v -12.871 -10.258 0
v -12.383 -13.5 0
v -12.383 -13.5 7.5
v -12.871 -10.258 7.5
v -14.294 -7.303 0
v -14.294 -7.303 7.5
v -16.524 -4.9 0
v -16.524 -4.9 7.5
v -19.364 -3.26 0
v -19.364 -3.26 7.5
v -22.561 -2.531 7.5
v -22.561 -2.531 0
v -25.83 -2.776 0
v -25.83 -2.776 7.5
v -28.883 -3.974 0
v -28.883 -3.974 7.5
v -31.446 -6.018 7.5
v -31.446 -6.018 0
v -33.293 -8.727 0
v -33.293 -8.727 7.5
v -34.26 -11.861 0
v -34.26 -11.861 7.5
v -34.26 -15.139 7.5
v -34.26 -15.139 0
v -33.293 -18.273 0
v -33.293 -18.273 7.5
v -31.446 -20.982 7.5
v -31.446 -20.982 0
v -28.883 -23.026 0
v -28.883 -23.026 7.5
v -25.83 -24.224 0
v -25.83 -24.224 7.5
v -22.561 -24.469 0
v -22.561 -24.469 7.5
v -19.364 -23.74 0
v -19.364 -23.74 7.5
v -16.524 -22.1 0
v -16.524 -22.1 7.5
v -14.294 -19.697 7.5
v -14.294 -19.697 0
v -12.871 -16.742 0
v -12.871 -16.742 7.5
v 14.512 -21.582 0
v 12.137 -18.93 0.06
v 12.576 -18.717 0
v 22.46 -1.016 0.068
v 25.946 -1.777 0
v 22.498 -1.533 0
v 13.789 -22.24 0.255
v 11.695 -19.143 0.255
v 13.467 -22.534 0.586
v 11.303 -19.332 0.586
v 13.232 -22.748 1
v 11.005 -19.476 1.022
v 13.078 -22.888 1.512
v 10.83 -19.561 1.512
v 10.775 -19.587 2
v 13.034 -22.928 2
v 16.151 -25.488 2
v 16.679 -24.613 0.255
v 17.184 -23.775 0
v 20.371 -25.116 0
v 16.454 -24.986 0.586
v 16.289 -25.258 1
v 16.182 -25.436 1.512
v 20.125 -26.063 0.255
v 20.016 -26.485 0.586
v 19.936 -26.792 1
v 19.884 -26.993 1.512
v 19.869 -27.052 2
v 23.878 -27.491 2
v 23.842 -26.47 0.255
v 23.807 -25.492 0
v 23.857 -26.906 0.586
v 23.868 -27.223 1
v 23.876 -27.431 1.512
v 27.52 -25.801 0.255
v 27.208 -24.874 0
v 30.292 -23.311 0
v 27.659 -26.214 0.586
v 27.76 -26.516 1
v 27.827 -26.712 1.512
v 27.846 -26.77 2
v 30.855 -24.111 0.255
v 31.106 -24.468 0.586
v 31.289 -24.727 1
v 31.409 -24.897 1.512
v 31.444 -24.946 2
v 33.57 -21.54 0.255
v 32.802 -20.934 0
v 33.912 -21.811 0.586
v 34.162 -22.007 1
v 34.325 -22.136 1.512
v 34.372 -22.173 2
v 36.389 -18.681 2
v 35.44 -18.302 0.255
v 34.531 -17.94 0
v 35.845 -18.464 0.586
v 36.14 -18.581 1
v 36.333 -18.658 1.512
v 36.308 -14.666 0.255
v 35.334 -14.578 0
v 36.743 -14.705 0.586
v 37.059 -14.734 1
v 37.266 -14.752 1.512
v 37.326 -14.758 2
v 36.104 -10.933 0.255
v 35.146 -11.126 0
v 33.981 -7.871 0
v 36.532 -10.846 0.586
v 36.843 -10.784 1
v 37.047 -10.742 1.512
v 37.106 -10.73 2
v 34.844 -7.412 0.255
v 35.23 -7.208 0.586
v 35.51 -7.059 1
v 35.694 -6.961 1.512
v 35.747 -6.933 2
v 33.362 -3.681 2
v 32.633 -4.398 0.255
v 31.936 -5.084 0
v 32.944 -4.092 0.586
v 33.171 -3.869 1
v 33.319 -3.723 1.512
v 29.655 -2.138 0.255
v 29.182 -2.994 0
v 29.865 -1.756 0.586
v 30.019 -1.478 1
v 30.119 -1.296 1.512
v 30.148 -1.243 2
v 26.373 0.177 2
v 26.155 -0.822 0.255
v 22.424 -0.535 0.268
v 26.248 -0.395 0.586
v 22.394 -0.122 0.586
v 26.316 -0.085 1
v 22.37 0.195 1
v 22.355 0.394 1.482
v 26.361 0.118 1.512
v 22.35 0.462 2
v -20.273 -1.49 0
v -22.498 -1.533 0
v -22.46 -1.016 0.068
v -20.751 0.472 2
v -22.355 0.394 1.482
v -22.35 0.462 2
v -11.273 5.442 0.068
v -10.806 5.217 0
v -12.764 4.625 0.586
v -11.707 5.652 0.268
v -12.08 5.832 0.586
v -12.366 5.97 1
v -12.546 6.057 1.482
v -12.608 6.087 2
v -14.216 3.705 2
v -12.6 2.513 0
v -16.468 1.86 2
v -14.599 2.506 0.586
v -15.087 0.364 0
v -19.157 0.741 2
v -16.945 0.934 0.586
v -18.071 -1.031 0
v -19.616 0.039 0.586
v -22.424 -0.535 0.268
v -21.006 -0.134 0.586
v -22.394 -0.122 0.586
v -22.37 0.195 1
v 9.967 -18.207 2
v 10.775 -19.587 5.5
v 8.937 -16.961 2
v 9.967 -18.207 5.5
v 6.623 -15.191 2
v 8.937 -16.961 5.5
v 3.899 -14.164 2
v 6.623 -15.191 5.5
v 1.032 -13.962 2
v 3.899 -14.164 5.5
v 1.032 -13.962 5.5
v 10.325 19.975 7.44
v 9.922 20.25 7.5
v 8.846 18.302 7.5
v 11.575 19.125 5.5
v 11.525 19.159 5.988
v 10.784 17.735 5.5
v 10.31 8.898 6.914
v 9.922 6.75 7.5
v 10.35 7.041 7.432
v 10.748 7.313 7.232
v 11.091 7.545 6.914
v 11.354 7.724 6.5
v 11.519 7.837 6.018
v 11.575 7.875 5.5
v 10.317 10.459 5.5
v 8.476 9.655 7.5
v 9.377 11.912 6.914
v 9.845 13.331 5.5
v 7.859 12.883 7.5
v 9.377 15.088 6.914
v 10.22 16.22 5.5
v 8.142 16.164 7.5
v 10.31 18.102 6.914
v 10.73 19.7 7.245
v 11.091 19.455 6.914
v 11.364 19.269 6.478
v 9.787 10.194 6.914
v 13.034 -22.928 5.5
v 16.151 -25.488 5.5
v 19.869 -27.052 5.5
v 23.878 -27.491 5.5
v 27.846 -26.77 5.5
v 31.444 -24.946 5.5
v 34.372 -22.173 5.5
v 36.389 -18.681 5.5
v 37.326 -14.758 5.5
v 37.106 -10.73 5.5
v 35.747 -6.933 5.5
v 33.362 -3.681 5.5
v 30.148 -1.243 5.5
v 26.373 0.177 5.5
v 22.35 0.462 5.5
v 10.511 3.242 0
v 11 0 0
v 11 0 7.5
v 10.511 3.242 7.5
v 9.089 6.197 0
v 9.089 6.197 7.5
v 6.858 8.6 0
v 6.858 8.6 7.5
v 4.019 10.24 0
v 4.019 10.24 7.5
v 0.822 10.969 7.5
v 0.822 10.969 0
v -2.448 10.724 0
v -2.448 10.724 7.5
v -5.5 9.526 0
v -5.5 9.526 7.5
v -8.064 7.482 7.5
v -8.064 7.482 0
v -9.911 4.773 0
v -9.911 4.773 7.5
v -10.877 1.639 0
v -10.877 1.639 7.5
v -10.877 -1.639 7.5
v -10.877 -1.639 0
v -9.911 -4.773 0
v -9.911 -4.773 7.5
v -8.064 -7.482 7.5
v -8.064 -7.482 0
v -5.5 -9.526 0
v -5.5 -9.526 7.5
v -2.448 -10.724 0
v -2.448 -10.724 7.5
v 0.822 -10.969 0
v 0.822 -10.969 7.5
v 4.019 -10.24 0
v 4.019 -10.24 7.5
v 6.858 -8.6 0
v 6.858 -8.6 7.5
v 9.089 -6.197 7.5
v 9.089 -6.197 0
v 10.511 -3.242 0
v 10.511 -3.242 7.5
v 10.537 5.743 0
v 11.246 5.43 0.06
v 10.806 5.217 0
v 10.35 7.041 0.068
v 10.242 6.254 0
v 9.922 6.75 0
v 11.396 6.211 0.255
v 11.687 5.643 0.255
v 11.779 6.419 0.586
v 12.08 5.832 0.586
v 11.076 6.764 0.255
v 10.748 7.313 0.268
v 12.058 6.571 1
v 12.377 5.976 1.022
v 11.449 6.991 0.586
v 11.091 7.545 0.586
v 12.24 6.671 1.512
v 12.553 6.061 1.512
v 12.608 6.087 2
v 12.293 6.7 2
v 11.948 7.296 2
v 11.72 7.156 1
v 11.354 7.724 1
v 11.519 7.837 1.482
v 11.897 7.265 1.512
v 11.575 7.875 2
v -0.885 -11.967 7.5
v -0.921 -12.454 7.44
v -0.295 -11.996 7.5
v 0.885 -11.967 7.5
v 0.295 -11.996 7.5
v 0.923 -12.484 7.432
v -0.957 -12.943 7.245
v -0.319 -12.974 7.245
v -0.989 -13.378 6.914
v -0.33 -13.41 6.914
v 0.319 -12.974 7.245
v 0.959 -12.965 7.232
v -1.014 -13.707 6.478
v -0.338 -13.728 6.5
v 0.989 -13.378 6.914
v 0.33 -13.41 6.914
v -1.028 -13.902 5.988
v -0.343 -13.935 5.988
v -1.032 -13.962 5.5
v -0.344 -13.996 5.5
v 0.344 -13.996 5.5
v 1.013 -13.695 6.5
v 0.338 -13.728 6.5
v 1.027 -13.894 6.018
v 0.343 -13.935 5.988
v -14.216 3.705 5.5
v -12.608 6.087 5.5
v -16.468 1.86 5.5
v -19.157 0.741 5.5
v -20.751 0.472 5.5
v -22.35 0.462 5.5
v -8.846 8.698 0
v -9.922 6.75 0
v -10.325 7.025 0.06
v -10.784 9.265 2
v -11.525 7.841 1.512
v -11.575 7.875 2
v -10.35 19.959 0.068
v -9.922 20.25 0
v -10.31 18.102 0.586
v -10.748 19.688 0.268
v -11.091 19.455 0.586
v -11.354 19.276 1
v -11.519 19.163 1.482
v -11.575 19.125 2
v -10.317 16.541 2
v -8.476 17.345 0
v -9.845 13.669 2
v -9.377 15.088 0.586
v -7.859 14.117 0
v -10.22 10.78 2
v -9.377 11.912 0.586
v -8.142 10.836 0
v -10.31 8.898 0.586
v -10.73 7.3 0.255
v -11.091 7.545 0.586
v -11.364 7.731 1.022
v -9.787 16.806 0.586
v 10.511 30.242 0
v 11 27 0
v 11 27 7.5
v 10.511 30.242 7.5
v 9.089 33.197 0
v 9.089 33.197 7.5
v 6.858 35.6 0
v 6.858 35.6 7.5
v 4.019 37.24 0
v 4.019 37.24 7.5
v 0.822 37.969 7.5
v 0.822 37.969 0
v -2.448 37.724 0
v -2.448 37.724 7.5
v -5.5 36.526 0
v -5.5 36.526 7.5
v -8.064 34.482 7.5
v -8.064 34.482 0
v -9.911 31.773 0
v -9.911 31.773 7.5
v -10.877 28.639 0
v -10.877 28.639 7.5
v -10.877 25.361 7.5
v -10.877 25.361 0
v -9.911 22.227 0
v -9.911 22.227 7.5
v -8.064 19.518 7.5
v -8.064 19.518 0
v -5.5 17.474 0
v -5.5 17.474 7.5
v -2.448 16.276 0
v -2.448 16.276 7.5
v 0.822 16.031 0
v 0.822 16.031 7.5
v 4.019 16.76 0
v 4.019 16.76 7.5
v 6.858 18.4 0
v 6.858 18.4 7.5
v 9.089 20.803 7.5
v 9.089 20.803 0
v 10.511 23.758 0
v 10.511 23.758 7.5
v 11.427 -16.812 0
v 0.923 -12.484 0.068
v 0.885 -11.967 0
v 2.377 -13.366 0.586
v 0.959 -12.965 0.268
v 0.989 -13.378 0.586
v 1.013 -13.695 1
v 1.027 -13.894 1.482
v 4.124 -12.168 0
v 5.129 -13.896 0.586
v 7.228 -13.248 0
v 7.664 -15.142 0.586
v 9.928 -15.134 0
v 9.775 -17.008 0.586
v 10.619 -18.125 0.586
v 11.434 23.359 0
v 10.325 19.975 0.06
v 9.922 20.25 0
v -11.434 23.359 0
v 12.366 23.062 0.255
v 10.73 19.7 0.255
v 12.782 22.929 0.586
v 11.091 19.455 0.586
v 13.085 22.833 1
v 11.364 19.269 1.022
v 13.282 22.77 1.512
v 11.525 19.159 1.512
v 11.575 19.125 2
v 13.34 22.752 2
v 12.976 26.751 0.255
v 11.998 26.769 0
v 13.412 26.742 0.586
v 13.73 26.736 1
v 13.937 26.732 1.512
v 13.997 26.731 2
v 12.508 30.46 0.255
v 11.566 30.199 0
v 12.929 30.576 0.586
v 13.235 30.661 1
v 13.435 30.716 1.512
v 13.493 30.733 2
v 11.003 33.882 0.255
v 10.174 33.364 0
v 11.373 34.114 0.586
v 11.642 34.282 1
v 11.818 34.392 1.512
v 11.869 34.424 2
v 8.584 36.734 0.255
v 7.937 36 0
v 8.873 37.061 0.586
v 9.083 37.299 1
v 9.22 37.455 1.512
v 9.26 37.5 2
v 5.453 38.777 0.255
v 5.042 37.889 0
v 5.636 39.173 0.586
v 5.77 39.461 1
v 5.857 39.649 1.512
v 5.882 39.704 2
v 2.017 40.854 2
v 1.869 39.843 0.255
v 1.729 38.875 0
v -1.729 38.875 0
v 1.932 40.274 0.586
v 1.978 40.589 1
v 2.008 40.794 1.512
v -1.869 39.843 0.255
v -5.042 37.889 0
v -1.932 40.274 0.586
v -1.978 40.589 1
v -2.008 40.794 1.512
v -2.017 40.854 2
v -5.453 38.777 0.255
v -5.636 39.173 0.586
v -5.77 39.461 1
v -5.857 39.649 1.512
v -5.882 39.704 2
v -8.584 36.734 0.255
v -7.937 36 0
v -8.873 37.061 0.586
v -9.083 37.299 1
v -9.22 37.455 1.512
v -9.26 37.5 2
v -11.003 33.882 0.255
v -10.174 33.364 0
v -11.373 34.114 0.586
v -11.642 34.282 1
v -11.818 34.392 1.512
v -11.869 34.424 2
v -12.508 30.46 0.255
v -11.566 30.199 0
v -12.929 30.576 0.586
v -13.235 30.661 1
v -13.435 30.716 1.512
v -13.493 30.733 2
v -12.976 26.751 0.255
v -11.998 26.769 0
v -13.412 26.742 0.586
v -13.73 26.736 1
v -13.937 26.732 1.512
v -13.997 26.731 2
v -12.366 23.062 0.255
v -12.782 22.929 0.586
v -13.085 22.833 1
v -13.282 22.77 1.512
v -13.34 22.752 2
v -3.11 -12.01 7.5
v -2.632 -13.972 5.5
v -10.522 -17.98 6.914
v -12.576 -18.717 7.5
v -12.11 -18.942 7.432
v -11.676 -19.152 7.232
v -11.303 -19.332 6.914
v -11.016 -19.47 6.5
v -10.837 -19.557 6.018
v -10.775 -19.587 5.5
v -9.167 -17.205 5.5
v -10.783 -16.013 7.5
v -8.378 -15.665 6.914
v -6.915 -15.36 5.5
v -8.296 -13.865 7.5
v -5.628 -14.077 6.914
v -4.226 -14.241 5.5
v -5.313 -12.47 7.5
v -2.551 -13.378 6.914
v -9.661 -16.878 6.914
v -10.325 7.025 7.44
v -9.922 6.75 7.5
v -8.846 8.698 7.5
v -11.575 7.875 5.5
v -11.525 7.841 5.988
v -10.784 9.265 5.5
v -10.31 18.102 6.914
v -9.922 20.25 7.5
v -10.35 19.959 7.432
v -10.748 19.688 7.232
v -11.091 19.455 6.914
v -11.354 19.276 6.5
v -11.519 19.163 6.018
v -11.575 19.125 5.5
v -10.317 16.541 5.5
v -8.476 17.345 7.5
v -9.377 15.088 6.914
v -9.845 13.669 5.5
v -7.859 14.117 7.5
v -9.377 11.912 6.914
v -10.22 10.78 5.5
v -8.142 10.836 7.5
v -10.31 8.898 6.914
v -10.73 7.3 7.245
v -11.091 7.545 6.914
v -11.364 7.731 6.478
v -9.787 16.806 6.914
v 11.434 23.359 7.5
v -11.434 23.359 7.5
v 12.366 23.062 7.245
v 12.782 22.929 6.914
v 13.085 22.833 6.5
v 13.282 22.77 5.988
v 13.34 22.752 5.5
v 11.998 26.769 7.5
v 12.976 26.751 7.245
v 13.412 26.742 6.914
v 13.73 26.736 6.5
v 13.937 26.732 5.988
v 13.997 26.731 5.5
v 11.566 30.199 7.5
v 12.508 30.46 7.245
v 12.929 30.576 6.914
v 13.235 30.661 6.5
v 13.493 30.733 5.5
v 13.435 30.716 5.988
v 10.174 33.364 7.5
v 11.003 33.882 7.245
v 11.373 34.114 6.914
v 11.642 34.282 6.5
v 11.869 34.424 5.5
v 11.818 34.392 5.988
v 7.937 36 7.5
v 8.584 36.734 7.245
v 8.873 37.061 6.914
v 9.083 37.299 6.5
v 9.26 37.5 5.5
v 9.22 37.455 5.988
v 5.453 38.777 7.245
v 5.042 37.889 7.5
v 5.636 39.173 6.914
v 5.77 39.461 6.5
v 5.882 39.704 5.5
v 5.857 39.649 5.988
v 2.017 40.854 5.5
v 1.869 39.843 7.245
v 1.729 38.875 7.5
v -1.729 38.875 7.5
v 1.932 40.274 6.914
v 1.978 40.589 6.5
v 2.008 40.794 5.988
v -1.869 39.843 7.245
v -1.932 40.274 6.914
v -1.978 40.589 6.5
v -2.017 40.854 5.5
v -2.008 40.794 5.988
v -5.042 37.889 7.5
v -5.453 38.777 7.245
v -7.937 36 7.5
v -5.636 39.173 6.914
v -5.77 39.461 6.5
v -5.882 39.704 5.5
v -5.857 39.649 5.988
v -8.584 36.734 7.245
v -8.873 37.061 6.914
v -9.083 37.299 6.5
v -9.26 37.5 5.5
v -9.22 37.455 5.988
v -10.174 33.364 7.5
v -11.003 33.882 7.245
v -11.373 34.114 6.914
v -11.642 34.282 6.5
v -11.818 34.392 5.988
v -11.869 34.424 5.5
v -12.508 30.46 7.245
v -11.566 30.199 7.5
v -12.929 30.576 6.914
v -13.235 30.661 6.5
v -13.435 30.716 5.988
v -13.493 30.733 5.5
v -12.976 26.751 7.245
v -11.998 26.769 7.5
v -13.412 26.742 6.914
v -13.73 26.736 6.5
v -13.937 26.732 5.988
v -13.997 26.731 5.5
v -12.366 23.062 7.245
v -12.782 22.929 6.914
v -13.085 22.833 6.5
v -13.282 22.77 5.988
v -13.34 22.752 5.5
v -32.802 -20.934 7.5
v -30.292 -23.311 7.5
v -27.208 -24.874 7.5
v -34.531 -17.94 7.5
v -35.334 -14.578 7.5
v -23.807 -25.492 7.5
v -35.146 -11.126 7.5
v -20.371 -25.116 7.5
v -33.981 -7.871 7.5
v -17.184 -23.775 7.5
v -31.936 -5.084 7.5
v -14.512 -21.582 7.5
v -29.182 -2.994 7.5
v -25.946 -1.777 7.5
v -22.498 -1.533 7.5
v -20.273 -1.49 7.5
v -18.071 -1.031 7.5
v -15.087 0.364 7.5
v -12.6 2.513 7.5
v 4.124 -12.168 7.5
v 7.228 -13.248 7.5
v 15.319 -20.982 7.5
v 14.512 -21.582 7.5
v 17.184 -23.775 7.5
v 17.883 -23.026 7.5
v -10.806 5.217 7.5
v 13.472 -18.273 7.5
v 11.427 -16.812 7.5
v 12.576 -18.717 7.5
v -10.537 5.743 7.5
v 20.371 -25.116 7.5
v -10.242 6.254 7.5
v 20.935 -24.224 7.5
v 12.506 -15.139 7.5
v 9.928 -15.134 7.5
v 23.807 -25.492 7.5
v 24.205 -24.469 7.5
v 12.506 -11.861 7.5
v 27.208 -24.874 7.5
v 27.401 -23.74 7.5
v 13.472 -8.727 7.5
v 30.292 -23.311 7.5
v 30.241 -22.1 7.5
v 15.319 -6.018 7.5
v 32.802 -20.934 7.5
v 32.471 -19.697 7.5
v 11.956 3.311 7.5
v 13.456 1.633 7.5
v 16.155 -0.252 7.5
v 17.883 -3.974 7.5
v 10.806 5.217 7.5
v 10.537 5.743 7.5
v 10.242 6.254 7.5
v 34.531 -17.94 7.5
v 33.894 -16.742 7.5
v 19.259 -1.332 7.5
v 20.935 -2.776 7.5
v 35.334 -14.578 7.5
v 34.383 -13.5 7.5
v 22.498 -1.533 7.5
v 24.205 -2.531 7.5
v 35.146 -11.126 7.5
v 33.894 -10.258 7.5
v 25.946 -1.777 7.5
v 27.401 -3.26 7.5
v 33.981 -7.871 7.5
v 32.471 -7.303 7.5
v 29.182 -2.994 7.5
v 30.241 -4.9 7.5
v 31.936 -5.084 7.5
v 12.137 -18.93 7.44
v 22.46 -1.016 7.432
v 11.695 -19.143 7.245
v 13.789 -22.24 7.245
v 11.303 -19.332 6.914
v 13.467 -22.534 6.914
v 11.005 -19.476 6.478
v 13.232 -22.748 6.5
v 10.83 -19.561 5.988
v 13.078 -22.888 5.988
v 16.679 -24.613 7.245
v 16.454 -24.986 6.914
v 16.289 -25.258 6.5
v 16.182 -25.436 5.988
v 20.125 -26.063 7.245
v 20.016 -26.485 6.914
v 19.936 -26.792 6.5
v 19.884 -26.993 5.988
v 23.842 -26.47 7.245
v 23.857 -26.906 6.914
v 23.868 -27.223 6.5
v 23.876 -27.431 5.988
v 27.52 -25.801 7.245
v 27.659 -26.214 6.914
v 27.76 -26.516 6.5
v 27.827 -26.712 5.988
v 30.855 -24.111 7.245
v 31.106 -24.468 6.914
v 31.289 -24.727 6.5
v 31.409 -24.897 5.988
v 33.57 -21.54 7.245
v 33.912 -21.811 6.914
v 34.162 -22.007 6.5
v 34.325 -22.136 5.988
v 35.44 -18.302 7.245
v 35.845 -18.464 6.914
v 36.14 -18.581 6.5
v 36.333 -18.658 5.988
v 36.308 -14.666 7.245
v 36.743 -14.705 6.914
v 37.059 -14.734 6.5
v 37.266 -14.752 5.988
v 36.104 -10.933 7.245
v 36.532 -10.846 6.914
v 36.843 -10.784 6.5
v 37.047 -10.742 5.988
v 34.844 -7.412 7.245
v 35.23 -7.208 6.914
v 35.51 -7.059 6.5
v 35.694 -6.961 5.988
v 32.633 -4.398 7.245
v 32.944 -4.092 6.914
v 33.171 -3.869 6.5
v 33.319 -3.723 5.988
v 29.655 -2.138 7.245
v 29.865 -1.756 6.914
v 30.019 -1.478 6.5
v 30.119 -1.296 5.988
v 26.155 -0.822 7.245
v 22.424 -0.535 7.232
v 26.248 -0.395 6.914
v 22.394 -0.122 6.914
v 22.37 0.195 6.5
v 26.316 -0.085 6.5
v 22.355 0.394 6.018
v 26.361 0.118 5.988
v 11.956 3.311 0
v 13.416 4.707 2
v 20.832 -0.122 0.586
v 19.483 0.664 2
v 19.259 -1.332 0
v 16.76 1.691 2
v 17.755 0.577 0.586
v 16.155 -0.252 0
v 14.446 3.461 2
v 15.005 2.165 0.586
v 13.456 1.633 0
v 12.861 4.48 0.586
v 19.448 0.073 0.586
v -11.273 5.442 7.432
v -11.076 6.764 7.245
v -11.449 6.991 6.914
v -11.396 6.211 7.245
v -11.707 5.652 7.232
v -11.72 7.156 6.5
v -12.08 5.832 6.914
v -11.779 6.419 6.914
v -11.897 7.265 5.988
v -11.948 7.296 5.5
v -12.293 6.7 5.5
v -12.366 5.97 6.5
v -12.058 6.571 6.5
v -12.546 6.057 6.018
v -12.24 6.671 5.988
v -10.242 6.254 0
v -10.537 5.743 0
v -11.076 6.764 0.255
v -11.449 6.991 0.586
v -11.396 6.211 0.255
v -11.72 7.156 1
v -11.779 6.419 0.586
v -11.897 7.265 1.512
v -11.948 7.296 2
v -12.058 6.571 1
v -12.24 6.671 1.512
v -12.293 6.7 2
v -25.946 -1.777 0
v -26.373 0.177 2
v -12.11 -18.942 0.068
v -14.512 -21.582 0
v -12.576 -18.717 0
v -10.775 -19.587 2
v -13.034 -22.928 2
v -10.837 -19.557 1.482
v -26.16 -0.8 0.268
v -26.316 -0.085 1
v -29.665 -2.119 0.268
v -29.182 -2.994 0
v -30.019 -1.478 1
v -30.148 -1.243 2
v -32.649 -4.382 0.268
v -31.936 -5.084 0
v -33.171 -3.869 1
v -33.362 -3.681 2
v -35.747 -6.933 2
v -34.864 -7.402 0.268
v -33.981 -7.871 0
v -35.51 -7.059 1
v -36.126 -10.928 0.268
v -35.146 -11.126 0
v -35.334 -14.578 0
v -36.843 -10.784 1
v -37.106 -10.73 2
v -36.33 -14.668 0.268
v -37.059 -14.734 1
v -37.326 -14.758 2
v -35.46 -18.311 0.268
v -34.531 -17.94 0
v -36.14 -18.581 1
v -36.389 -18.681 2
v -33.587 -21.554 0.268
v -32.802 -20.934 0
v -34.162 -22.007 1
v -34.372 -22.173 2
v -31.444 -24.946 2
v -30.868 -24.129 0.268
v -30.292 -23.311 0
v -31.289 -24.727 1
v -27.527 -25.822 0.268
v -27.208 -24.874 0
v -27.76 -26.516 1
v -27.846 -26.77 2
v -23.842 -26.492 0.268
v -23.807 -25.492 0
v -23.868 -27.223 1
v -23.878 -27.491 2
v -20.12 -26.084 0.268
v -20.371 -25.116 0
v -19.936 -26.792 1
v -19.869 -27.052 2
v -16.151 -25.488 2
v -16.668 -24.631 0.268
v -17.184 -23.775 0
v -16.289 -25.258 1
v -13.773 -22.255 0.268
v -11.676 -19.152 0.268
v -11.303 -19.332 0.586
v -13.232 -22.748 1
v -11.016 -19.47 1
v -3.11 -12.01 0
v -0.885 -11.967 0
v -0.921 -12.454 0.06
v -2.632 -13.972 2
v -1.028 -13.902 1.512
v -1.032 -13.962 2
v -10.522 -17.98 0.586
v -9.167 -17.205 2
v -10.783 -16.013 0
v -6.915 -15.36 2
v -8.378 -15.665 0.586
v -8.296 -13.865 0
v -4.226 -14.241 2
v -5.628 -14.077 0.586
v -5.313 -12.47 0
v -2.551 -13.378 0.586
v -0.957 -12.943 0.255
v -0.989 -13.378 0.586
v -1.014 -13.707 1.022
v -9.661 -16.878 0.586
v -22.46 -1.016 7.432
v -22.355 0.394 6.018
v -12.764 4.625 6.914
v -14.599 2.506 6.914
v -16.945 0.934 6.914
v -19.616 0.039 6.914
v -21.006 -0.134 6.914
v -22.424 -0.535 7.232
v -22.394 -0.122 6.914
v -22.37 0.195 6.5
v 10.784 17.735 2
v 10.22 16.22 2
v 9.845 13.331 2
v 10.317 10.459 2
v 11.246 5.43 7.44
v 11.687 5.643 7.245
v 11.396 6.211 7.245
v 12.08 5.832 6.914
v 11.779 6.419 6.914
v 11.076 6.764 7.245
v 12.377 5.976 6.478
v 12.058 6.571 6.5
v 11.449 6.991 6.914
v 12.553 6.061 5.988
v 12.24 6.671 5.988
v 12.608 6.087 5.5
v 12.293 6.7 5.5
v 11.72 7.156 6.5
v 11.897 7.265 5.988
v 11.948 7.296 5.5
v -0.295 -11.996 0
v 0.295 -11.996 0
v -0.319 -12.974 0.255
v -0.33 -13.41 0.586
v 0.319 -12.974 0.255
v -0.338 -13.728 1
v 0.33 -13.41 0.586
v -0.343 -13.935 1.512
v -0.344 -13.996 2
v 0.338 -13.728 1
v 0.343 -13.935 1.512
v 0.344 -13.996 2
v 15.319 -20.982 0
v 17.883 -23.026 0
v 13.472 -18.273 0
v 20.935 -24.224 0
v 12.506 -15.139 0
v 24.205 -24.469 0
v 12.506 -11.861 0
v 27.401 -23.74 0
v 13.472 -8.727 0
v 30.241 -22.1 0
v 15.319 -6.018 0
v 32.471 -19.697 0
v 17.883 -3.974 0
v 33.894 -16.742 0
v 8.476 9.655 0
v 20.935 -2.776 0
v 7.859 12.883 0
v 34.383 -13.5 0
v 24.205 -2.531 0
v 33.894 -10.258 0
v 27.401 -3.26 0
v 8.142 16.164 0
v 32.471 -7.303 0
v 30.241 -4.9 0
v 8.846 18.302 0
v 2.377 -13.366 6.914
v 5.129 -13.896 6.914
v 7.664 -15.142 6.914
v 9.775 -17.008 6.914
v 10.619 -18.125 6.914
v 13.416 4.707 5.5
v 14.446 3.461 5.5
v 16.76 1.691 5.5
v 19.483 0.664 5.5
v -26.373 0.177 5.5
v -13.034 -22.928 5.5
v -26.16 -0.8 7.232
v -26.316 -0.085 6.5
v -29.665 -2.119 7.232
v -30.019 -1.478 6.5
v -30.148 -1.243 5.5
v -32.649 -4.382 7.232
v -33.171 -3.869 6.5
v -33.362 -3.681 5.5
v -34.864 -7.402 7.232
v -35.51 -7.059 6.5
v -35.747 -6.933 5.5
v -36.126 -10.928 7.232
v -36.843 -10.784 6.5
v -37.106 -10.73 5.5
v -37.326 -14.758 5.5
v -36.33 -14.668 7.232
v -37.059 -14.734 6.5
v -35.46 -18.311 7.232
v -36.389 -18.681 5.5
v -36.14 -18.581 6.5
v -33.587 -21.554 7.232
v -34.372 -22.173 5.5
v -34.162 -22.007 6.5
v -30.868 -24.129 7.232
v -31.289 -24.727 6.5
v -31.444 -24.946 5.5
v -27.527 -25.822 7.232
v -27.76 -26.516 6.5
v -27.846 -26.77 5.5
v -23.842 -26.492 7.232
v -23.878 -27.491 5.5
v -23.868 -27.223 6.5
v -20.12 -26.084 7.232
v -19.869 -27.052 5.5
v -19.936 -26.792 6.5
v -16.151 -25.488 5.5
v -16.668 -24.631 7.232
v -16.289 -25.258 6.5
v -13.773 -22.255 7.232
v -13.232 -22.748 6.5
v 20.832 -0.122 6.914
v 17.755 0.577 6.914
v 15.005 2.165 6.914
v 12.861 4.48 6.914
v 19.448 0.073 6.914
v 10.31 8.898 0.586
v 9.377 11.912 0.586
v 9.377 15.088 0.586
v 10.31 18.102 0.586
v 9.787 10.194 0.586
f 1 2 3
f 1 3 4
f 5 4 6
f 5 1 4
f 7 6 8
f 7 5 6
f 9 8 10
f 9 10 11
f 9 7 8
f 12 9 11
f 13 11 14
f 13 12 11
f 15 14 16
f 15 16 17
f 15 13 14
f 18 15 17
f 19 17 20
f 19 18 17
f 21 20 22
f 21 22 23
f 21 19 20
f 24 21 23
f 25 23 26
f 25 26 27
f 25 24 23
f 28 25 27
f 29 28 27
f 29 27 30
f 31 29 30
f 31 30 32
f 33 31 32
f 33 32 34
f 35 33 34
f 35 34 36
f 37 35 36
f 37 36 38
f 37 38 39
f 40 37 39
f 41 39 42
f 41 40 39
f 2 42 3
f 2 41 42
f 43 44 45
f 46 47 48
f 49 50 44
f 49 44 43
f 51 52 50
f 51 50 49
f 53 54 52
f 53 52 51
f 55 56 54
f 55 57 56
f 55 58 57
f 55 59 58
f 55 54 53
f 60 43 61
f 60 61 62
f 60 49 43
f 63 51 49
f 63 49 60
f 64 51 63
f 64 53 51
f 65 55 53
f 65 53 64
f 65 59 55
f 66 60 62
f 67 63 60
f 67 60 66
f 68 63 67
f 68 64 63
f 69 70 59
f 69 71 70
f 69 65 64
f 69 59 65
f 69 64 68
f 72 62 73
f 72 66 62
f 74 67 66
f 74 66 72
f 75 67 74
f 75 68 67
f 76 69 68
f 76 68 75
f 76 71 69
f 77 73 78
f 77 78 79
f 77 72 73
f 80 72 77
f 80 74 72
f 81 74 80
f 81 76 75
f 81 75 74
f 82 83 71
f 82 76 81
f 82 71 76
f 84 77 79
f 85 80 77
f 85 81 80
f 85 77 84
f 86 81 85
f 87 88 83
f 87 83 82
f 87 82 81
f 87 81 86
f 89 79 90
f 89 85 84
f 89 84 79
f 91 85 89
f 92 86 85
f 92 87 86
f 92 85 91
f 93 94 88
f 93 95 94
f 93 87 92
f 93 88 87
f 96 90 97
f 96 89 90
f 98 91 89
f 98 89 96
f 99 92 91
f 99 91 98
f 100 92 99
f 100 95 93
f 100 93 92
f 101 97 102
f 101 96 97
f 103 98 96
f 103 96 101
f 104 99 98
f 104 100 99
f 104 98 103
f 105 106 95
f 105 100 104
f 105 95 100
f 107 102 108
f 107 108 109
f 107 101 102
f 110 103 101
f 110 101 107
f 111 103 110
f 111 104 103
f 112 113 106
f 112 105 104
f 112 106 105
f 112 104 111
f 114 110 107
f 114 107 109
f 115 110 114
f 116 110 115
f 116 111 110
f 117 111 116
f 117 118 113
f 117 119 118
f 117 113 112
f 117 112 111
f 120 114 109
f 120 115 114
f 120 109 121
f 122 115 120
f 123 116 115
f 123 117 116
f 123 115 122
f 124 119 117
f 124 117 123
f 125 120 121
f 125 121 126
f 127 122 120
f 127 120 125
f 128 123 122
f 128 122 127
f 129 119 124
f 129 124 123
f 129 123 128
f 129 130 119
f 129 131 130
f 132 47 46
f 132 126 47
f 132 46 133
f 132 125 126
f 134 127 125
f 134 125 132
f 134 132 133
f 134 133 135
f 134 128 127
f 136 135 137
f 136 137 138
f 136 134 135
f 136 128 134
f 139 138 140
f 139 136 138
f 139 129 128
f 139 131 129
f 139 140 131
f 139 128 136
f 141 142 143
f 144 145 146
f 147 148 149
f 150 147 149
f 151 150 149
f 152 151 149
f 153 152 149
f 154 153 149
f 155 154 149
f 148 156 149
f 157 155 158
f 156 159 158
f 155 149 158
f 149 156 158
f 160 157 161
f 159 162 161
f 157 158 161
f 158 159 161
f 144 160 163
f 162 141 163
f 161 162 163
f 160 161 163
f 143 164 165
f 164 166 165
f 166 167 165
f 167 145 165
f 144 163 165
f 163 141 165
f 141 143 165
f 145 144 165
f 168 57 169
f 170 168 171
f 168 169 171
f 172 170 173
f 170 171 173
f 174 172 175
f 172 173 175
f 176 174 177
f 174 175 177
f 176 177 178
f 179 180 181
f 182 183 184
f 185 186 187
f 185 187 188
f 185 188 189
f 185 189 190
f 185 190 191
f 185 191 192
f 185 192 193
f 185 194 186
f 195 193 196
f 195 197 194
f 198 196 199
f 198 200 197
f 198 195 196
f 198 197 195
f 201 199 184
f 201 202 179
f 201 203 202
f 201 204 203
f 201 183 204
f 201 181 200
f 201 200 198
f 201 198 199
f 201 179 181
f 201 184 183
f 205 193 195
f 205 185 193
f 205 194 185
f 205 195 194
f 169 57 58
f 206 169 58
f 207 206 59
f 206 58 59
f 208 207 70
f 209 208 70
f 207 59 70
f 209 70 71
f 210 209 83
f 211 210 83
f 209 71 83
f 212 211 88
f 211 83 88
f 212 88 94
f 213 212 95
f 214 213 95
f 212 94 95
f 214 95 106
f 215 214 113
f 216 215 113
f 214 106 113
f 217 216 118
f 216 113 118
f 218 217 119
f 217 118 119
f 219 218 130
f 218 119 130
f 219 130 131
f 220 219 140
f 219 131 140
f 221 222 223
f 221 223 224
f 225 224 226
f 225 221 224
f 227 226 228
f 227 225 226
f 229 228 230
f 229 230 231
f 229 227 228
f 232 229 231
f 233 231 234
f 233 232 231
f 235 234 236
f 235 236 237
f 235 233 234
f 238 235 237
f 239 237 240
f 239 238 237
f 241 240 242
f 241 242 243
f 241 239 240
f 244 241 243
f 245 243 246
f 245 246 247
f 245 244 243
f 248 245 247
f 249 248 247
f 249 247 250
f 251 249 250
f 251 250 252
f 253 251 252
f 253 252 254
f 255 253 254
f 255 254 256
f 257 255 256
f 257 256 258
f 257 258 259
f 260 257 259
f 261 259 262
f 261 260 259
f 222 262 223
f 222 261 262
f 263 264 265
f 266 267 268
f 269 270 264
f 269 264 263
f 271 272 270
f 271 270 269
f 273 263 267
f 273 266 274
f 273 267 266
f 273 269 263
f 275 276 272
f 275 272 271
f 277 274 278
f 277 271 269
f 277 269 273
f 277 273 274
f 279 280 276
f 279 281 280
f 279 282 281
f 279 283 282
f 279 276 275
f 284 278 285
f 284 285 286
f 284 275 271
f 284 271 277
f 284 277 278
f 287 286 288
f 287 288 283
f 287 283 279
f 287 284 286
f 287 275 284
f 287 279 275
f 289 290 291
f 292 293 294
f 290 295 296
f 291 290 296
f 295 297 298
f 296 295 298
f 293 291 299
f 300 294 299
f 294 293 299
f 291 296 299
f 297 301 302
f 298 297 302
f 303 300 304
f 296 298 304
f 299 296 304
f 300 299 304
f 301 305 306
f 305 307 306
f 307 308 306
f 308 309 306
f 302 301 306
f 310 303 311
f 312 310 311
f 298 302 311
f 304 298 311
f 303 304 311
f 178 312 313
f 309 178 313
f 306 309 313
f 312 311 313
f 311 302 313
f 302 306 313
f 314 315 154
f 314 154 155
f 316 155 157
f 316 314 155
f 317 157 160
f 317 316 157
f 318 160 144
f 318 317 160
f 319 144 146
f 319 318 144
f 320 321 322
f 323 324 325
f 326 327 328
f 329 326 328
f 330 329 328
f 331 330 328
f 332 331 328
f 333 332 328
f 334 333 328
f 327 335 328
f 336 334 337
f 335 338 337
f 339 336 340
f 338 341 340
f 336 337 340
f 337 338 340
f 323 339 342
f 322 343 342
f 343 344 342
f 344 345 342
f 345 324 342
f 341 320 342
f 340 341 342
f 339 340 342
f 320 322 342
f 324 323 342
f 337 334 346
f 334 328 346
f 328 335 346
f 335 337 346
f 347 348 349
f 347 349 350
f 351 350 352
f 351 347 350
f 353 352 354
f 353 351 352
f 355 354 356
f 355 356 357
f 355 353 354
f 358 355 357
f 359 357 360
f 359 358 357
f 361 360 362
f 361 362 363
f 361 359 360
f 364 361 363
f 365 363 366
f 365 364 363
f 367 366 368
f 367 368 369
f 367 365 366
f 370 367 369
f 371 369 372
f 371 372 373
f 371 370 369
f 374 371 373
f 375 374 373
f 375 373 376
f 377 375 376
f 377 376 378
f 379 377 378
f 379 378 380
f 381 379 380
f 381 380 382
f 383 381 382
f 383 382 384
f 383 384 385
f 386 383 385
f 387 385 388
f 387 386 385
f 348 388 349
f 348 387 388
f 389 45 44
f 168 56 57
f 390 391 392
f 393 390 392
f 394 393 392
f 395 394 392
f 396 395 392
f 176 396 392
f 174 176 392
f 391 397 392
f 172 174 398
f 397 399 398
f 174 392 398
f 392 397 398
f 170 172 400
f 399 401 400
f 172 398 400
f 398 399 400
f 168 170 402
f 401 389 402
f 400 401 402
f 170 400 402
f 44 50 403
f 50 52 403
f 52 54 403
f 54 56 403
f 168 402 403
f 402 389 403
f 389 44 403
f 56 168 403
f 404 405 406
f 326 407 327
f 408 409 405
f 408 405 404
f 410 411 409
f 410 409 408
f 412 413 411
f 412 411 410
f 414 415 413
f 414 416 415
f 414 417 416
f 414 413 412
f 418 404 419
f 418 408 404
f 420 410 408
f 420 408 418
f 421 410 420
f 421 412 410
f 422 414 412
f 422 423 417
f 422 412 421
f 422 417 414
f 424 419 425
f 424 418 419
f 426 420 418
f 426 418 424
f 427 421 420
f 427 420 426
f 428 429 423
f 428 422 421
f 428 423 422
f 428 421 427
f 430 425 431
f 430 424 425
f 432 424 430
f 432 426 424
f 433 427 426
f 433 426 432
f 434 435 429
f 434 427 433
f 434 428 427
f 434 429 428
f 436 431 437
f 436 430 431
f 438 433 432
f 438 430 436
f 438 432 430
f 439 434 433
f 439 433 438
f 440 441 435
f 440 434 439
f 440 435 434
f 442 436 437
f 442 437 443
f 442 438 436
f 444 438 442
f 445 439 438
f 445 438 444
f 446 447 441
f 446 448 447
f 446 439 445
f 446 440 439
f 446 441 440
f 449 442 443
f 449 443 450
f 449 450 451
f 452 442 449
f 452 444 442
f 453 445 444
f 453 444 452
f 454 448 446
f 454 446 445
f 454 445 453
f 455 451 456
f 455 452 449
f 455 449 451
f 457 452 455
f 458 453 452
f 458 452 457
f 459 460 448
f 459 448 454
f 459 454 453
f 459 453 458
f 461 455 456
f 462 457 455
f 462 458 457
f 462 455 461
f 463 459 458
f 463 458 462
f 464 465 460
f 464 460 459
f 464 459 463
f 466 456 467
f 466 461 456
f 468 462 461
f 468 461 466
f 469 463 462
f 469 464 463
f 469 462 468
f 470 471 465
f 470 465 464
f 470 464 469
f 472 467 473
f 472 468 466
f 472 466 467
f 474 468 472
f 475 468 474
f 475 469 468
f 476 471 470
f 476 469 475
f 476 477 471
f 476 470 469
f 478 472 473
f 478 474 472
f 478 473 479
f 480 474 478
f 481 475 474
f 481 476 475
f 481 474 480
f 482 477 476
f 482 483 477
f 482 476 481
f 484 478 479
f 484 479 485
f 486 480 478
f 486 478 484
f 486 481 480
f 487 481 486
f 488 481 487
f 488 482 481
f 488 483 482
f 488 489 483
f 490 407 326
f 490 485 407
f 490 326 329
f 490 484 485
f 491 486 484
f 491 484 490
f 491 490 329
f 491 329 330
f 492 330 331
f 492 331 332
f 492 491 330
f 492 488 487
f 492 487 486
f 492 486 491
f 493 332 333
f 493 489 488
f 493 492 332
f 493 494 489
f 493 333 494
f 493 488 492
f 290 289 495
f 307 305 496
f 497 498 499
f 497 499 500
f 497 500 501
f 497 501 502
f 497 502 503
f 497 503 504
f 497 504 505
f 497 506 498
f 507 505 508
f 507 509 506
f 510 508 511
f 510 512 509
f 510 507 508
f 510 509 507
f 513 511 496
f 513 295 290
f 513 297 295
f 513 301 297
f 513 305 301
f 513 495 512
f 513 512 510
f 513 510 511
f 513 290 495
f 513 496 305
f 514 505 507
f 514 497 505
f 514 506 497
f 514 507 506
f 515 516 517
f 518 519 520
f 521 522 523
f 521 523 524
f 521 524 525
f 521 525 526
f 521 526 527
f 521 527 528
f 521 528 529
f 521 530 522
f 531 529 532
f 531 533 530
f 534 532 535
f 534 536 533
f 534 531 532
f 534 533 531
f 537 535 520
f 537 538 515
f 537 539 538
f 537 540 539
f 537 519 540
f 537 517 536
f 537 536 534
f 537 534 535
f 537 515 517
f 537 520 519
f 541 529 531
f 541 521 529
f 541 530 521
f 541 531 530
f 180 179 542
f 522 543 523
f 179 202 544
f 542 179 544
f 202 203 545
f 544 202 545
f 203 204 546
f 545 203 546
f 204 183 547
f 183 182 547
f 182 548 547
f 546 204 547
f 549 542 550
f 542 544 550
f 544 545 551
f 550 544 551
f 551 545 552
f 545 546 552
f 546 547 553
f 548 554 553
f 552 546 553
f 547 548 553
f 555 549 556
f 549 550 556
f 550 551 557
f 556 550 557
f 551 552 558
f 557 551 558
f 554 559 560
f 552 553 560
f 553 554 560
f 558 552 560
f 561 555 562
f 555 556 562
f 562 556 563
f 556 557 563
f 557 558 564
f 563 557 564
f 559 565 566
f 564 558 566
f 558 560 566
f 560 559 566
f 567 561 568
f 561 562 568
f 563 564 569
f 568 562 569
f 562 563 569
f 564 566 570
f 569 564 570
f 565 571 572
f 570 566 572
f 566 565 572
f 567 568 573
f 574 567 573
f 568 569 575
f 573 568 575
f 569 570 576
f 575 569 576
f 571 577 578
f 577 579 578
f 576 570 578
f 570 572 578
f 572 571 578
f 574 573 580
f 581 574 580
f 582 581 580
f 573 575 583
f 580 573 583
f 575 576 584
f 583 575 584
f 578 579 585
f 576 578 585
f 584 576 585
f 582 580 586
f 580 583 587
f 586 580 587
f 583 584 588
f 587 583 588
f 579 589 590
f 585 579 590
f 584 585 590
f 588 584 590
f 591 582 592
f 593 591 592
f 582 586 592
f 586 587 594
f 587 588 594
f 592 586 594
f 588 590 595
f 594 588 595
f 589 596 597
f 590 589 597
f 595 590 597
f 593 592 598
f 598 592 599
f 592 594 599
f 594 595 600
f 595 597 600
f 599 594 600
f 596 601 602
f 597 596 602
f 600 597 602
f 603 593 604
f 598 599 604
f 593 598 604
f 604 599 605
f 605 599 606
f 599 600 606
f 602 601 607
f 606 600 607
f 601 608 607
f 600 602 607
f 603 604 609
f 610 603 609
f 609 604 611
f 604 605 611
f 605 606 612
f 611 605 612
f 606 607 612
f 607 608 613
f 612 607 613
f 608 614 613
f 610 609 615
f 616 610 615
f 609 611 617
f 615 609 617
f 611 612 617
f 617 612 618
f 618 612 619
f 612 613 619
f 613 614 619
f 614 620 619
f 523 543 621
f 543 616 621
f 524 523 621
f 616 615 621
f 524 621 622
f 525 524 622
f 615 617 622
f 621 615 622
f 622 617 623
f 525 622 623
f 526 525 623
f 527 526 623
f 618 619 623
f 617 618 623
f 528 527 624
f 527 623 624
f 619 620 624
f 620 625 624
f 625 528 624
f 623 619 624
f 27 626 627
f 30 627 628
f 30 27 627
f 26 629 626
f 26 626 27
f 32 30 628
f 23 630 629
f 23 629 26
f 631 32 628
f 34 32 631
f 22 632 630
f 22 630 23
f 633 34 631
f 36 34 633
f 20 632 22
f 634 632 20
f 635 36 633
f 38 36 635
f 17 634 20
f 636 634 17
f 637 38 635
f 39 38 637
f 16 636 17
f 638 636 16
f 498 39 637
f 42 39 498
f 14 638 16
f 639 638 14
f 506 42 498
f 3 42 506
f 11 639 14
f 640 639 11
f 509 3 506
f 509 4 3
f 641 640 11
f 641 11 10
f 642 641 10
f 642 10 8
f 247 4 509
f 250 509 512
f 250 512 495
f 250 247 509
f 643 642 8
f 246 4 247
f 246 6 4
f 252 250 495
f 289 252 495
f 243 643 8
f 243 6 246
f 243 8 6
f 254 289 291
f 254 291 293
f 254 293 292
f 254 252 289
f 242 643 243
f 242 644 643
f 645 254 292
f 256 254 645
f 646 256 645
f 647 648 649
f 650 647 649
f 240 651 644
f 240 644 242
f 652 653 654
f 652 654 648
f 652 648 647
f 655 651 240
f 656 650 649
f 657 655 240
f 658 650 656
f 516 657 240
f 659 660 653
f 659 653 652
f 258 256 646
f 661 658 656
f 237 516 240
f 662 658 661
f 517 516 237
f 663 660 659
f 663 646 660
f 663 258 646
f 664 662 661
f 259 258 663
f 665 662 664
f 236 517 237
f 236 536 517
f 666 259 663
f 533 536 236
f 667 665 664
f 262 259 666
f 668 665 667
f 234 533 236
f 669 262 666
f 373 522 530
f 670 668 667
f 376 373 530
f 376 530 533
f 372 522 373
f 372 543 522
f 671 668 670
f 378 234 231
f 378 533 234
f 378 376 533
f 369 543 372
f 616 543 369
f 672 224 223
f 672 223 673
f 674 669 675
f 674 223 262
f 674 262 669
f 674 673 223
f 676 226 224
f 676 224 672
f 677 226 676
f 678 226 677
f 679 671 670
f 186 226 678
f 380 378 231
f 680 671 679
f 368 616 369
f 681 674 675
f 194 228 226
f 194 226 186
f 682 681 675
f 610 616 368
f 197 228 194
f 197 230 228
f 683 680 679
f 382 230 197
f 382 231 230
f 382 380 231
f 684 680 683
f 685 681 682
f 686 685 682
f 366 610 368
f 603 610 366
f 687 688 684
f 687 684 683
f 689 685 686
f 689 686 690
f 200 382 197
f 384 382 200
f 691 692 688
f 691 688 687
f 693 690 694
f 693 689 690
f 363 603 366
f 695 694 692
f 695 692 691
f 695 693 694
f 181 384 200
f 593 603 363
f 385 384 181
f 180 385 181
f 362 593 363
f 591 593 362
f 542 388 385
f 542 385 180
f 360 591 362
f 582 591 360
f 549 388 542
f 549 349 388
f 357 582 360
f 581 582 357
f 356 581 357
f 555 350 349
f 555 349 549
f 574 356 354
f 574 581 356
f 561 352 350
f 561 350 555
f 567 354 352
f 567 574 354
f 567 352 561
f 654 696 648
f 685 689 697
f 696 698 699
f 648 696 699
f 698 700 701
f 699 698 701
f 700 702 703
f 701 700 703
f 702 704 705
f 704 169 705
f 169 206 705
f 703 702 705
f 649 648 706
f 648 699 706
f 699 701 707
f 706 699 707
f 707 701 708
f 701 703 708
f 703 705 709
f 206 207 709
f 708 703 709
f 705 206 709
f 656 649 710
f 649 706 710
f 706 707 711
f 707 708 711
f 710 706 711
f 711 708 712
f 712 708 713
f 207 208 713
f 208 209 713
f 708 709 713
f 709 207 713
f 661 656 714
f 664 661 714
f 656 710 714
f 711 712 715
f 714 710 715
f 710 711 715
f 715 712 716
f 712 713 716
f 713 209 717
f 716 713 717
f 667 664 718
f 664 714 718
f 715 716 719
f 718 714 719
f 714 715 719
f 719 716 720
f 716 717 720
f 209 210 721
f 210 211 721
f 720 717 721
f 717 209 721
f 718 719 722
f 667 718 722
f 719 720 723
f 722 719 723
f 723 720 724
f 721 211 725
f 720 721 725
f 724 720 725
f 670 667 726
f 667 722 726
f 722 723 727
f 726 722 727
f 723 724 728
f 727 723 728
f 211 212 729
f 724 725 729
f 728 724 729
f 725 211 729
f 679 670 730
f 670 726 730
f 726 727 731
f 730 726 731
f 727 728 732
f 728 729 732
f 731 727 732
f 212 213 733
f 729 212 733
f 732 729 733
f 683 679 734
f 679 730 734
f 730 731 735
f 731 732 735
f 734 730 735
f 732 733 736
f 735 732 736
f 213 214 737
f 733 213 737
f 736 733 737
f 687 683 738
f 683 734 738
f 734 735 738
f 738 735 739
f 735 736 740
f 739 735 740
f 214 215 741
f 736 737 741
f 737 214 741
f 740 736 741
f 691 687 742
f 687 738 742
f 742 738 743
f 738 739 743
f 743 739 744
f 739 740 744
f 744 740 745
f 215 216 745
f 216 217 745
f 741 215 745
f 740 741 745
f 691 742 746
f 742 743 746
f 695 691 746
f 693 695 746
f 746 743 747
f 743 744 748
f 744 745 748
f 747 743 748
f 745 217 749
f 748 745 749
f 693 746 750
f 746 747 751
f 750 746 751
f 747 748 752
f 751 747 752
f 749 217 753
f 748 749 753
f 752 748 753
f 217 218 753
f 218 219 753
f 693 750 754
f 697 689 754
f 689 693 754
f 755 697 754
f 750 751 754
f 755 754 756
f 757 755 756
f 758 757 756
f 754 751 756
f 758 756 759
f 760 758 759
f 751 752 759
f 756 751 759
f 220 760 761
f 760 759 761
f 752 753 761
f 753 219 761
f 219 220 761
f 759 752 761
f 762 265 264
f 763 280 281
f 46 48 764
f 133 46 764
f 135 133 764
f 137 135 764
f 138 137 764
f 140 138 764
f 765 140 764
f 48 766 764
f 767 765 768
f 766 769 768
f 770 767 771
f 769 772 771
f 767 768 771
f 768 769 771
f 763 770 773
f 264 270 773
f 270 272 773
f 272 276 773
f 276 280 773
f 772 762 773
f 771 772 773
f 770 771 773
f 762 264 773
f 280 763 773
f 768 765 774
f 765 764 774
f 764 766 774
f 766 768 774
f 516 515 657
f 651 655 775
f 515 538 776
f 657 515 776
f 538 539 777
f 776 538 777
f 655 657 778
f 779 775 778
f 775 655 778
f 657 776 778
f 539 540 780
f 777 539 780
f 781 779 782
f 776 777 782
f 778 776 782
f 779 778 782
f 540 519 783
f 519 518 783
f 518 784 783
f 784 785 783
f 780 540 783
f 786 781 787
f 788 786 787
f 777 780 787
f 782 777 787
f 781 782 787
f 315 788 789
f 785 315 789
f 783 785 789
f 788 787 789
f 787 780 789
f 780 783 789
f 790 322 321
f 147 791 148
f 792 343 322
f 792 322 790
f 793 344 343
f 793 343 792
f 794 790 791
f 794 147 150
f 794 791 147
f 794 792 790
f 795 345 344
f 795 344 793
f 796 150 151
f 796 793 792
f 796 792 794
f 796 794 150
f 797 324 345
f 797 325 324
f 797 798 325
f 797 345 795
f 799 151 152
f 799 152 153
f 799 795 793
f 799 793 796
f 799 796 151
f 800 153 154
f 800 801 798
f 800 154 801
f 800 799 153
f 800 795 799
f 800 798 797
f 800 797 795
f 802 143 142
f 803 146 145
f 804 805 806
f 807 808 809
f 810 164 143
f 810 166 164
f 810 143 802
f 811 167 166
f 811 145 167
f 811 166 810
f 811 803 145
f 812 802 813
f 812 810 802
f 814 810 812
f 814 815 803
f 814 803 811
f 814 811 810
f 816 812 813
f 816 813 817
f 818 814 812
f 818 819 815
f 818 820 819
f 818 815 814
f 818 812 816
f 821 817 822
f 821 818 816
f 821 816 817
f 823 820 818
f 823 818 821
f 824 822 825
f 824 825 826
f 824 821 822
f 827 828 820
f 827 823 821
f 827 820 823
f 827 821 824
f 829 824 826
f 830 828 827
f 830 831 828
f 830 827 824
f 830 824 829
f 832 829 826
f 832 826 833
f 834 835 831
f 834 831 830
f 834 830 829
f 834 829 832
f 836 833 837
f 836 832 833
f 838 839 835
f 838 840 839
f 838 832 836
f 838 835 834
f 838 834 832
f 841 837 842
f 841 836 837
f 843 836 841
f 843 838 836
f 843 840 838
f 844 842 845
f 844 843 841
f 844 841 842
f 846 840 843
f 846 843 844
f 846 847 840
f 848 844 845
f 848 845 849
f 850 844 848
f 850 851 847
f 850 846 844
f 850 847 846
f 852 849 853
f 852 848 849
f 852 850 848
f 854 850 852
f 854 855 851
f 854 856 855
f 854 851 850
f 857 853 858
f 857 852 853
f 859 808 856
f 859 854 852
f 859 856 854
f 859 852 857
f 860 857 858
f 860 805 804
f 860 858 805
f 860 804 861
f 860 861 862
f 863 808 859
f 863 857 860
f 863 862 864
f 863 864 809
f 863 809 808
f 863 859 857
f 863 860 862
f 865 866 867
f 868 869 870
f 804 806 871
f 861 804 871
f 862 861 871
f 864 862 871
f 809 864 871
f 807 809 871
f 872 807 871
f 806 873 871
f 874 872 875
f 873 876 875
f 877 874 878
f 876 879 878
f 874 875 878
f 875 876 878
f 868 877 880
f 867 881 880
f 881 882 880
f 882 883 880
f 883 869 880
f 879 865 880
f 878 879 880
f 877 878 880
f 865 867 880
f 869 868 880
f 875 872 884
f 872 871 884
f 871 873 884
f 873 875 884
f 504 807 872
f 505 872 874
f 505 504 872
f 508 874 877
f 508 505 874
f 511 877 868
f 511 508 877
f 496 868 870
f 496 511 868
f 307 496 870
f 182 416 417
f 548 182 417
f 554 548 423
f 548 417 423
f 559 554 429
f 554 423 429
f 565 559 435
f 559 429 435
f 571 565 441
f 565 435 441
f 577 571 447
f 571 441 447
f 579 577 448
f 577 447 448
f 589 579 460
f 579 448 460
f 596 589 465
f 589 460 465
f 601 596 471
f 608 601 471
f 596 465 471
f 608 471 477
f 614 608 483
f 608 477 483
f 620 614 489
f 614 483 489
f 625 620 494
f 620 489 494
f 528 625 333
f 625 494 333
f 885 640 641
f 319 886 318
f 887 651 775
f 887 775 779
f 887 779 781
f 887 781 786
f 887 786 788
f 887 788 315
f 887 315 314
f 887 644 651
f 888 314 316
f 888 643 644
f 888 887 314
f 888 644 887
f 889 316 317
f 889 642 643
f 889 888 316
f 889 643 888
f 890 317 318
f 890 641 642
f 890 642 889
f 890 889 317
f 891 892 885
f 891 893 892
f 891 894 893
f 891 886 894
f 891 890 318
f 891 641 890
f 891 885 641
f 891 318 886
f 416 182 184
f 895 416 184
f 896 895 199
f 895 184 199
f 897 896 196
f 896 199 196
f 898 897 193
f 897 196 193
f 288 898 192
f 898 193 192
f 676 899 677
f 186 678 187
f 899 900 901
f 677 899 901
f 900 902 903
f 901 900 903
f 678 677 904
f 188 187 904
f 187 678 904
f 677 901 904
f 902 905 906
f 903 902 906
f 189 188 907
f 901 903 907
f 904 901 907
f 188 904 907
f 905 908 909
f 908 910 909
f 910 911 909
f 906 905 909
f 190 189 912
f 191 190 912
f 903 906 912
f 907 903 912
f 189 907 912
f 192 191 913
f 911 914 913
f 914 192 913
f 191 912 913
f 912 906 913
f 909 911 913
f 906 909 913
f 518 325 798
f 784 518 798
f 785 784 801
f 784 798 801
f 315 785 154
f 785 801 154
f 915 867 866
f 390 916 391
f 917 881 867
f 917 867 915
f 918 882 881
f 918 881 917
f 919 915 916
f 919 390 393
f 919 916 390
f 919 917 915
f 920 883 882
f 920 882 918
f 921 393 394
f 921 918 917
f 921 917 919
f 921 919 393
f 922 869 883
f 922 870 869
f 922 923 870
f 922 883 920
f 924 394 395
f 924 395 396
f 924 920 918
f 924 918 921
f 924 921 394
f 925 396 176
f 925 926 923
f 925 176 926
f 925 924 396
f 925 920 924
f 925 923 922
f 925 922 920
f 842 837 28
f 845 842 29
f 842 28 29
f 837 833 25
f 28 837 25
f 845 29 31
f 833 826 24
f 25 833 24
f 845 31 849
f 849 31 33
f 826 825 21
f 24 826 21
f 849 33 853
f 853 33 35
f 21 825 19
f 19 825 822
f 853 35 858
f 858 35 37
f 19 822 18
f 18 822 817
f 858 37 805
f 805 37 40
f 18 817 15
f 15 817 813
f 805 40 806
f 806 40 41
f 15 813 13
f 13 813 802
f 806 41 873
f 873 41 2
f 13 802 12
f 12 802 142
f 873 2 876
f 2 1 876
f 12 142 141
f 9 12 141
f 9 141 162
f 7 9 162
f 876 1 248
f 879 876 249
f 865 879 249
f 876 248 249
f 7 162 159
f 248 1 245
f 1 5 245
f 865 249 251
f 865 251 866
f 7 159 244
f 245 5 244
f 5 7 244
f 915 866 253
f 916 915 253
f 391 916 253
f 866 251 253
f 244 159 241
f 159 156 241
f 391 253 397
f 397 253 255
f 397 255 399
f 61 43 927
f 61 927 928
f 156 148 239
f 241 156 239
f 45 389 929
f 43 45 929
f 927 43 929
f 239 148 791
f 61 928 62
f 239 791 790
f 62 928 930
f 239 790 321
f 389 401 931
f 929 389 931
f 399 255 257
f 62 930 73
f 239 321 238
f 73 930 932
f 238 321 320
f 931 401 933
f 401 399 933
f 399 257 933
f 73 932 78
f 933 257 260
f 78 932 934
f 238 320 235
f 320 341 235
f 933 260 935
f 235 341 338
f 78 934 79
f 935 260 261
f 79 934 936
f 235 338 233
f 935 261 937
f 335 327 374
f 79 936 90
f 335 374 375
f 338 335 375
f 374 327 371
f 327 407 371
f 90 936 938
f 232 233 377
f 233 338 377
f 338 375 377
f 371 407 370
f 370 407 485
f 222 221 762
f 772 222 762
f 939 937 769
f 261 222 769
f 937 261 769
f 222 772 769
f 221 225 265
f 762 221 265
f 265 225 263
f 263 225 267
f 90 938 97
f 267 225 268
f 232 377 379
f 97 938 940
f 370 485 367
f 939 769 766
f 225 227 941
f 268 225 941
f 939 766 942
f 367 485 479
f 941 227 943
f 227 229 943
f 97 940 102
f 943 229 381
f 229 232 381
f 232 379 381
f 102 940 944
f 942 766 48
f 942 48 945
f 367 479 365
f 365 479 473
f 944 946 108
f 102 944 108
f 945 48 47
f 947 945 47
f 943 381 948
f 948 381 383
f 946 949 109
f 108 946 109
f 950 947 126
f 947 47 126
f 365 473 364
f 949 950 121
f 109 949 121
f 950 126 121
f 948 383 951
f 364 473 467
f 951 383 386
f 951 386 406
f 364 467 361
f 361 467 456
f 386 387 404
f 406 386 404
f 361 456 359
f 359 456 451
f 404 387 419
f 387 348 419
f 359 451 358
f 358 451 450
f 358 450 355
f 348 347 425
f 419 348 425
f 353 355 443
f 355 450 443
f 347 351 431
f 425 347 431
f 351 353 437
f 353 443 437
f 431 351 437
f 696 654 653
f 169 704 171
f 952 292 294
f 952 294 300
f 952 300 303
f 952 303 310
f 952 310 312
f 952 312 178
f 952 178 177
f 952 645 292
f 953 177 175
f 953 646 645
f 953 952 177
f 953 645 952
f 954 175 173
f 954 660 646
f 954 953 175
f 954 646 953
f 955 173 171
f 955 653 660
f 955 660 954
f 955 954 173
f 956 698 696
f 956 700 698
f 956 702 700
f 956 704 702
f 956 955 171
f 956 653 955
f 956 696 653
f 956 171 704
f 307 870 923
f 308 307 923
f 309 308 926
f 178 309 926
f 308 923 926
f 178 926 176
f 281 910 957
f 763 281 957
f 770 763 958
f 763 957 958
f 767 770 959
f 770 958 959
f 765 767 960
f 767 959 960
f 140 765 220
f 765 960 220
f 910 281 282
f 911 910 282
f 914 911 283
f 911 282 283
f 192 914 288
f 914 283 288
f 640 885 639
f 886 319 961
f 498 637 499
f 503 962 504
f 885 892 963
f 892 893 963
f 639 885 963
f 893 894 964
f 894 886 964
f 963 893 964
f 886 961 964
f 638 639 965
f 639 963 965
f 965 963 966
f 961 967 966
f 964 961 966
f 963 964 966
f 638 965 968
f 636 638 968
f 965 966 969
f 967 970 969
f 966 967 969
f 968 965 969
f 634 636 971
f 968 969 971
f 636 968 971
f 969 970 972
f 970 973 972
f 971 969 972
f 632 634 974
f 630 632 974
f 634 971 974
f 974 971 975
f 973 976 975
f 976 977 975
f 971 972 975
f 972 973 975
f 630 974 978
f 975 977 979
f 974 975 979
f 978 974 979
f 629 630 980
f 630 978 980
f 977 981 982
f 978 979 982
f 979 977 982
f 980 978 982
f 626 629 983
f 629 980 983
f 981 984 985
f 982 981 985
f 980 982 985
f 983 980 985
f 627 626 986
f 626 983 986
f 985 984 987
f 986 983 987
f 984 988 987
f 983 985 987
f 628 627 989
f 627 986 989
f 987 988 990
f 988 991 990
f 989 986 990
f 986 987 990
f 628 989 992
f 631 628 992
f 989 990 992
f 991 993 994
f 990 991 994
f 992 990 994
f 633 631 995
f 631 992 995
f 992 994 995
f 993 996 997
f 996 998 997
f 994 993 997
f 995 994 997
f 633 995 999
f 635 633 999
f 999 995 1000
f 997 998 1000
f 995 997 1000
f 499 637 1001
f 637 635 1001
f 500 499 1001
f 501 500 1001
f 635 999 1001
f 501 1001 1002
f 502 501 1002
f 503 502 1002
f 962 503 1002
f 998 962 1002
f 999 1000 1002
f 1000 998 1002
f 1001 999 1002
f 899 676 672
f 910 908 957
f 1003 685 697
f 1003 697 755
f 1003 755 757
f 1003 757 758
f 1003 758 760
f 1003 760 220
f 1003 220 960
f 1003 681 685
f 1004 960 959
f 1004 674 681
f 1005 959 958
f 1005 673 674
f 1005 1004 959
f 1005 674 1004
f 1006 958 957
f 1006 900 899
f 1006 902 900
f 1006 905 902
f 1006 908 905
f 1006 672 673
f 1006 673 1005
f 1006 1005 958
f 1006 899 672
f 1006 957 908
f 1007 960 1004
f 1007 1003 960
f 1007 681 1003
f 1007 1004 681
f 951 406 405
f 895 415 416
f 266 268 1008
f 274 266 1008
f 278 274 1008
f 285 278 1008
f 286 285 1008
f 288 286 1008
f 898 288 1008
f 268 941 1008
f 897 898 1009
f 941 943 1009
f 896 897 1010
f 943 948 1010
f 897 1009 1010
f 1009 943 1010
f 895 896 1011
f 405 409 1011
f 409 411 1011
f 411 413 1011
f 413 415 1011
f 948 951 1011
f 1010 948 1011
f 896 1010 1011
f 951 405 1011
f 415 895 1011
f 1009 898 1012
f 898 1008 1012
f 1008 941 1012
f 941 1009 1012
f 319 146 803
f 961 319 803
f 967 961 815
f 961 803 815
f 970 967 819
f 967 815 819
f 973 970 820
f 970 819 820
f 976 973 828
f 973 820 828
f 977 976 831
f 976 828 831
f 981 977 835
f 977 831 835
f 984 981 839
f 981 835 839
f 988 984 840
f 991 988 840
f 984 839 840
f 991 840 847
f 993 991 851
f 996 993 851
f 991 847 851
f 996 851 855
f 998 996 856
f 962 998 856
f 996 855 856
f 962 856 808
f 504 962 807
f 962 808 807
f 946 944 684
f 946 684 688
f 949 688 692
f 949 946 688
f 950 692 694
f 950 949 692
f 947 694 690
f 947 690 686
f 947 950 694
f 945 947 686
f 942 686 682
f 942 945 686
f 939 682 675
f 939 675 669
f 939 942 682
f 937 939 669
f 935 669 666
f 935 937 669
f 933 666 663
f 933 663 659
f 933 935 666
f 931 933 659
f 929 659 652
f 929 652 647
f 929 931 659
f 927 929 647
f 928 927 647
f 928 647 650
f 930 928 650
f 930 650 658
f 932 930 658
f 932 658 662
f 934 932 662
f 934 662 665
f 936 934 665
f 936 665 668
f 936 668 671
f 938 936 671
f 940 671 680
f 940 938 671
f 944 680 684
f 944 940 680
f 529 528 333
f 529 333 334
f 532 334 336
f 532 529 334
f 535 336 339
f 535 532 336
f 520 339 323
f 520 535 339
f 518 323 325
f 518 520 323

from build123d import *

# Parameters (mm, degrees)
F0_R     = 11
F1_DEPTH = 7.5
F2_R     = 10
F3_R     = 2


with BuildPart() as f1:
    # F0 (on Top) → F1 (new body)
    with BuildSketch(Plane.XY):
        with BuildLine():
            ThreePointArc((3.708099, 13.5), (0, 41), (-3.708099, 13.5))
            ThreePointArc((-3.708099, 13.5), (-12.124356, 7), (-13.545393, -3.538692))
            ThreePointArc((-13.545393, -3.538692), (-35.507042, -20.5), (-9.837293, -9.961308))
            ThreePointArc((-9.837293, -9.961308), (0, -14), (9.837293, -9.961308))
            ThreePointArc((9.837293, -9.961308), (35.507042, -20.5), (13.545393, -3.538692))
            ThreePointArc((13.545393, -3.538692), (12.124356, 7), (3.708099, 13.5))
        make_face()
        with Locations((-23.382686, -13.5)):
            Circle(F0_R, mode=Mode.SUBTRACT)
        with Locations((23.382686, -13.5)):
            Circle(F0_R, mode=Mode.SUBTRACT)
        Circle(F0_R, mode=Mode.SUBTRACT)
        with Locations((0, 27)):
            Circle(F0_R, mode=Mode.SUBTRACT)
    extrude(amount=F1_DEPTH)

    # F2
    f2_edges = [f1.edges().sort_by_distance(p)[0] for p in [
        (-9.837293, -9.961308, 3.75),
        (9.837293, -9.961308, 3.75),
        (-13.545393, -3.538692, 3.75),
        (-3.708099, 13.5, 3.75),
        (3.708099, 13.5, 3.75),
        (13.545393, -3.538692, 3.75),
    ]]
    fillet(f2_edges, radius=F2_R)

    # F3
    f3_edges = [f1.edges().sort_by_distance(p)[0] for p in [
        (-35.507042, -20.5, 7.5),
        (-35.507042, -20.5, 0),
    ]]
    fillet(f3_edges, radius=F3_R)


solid = f1.part
